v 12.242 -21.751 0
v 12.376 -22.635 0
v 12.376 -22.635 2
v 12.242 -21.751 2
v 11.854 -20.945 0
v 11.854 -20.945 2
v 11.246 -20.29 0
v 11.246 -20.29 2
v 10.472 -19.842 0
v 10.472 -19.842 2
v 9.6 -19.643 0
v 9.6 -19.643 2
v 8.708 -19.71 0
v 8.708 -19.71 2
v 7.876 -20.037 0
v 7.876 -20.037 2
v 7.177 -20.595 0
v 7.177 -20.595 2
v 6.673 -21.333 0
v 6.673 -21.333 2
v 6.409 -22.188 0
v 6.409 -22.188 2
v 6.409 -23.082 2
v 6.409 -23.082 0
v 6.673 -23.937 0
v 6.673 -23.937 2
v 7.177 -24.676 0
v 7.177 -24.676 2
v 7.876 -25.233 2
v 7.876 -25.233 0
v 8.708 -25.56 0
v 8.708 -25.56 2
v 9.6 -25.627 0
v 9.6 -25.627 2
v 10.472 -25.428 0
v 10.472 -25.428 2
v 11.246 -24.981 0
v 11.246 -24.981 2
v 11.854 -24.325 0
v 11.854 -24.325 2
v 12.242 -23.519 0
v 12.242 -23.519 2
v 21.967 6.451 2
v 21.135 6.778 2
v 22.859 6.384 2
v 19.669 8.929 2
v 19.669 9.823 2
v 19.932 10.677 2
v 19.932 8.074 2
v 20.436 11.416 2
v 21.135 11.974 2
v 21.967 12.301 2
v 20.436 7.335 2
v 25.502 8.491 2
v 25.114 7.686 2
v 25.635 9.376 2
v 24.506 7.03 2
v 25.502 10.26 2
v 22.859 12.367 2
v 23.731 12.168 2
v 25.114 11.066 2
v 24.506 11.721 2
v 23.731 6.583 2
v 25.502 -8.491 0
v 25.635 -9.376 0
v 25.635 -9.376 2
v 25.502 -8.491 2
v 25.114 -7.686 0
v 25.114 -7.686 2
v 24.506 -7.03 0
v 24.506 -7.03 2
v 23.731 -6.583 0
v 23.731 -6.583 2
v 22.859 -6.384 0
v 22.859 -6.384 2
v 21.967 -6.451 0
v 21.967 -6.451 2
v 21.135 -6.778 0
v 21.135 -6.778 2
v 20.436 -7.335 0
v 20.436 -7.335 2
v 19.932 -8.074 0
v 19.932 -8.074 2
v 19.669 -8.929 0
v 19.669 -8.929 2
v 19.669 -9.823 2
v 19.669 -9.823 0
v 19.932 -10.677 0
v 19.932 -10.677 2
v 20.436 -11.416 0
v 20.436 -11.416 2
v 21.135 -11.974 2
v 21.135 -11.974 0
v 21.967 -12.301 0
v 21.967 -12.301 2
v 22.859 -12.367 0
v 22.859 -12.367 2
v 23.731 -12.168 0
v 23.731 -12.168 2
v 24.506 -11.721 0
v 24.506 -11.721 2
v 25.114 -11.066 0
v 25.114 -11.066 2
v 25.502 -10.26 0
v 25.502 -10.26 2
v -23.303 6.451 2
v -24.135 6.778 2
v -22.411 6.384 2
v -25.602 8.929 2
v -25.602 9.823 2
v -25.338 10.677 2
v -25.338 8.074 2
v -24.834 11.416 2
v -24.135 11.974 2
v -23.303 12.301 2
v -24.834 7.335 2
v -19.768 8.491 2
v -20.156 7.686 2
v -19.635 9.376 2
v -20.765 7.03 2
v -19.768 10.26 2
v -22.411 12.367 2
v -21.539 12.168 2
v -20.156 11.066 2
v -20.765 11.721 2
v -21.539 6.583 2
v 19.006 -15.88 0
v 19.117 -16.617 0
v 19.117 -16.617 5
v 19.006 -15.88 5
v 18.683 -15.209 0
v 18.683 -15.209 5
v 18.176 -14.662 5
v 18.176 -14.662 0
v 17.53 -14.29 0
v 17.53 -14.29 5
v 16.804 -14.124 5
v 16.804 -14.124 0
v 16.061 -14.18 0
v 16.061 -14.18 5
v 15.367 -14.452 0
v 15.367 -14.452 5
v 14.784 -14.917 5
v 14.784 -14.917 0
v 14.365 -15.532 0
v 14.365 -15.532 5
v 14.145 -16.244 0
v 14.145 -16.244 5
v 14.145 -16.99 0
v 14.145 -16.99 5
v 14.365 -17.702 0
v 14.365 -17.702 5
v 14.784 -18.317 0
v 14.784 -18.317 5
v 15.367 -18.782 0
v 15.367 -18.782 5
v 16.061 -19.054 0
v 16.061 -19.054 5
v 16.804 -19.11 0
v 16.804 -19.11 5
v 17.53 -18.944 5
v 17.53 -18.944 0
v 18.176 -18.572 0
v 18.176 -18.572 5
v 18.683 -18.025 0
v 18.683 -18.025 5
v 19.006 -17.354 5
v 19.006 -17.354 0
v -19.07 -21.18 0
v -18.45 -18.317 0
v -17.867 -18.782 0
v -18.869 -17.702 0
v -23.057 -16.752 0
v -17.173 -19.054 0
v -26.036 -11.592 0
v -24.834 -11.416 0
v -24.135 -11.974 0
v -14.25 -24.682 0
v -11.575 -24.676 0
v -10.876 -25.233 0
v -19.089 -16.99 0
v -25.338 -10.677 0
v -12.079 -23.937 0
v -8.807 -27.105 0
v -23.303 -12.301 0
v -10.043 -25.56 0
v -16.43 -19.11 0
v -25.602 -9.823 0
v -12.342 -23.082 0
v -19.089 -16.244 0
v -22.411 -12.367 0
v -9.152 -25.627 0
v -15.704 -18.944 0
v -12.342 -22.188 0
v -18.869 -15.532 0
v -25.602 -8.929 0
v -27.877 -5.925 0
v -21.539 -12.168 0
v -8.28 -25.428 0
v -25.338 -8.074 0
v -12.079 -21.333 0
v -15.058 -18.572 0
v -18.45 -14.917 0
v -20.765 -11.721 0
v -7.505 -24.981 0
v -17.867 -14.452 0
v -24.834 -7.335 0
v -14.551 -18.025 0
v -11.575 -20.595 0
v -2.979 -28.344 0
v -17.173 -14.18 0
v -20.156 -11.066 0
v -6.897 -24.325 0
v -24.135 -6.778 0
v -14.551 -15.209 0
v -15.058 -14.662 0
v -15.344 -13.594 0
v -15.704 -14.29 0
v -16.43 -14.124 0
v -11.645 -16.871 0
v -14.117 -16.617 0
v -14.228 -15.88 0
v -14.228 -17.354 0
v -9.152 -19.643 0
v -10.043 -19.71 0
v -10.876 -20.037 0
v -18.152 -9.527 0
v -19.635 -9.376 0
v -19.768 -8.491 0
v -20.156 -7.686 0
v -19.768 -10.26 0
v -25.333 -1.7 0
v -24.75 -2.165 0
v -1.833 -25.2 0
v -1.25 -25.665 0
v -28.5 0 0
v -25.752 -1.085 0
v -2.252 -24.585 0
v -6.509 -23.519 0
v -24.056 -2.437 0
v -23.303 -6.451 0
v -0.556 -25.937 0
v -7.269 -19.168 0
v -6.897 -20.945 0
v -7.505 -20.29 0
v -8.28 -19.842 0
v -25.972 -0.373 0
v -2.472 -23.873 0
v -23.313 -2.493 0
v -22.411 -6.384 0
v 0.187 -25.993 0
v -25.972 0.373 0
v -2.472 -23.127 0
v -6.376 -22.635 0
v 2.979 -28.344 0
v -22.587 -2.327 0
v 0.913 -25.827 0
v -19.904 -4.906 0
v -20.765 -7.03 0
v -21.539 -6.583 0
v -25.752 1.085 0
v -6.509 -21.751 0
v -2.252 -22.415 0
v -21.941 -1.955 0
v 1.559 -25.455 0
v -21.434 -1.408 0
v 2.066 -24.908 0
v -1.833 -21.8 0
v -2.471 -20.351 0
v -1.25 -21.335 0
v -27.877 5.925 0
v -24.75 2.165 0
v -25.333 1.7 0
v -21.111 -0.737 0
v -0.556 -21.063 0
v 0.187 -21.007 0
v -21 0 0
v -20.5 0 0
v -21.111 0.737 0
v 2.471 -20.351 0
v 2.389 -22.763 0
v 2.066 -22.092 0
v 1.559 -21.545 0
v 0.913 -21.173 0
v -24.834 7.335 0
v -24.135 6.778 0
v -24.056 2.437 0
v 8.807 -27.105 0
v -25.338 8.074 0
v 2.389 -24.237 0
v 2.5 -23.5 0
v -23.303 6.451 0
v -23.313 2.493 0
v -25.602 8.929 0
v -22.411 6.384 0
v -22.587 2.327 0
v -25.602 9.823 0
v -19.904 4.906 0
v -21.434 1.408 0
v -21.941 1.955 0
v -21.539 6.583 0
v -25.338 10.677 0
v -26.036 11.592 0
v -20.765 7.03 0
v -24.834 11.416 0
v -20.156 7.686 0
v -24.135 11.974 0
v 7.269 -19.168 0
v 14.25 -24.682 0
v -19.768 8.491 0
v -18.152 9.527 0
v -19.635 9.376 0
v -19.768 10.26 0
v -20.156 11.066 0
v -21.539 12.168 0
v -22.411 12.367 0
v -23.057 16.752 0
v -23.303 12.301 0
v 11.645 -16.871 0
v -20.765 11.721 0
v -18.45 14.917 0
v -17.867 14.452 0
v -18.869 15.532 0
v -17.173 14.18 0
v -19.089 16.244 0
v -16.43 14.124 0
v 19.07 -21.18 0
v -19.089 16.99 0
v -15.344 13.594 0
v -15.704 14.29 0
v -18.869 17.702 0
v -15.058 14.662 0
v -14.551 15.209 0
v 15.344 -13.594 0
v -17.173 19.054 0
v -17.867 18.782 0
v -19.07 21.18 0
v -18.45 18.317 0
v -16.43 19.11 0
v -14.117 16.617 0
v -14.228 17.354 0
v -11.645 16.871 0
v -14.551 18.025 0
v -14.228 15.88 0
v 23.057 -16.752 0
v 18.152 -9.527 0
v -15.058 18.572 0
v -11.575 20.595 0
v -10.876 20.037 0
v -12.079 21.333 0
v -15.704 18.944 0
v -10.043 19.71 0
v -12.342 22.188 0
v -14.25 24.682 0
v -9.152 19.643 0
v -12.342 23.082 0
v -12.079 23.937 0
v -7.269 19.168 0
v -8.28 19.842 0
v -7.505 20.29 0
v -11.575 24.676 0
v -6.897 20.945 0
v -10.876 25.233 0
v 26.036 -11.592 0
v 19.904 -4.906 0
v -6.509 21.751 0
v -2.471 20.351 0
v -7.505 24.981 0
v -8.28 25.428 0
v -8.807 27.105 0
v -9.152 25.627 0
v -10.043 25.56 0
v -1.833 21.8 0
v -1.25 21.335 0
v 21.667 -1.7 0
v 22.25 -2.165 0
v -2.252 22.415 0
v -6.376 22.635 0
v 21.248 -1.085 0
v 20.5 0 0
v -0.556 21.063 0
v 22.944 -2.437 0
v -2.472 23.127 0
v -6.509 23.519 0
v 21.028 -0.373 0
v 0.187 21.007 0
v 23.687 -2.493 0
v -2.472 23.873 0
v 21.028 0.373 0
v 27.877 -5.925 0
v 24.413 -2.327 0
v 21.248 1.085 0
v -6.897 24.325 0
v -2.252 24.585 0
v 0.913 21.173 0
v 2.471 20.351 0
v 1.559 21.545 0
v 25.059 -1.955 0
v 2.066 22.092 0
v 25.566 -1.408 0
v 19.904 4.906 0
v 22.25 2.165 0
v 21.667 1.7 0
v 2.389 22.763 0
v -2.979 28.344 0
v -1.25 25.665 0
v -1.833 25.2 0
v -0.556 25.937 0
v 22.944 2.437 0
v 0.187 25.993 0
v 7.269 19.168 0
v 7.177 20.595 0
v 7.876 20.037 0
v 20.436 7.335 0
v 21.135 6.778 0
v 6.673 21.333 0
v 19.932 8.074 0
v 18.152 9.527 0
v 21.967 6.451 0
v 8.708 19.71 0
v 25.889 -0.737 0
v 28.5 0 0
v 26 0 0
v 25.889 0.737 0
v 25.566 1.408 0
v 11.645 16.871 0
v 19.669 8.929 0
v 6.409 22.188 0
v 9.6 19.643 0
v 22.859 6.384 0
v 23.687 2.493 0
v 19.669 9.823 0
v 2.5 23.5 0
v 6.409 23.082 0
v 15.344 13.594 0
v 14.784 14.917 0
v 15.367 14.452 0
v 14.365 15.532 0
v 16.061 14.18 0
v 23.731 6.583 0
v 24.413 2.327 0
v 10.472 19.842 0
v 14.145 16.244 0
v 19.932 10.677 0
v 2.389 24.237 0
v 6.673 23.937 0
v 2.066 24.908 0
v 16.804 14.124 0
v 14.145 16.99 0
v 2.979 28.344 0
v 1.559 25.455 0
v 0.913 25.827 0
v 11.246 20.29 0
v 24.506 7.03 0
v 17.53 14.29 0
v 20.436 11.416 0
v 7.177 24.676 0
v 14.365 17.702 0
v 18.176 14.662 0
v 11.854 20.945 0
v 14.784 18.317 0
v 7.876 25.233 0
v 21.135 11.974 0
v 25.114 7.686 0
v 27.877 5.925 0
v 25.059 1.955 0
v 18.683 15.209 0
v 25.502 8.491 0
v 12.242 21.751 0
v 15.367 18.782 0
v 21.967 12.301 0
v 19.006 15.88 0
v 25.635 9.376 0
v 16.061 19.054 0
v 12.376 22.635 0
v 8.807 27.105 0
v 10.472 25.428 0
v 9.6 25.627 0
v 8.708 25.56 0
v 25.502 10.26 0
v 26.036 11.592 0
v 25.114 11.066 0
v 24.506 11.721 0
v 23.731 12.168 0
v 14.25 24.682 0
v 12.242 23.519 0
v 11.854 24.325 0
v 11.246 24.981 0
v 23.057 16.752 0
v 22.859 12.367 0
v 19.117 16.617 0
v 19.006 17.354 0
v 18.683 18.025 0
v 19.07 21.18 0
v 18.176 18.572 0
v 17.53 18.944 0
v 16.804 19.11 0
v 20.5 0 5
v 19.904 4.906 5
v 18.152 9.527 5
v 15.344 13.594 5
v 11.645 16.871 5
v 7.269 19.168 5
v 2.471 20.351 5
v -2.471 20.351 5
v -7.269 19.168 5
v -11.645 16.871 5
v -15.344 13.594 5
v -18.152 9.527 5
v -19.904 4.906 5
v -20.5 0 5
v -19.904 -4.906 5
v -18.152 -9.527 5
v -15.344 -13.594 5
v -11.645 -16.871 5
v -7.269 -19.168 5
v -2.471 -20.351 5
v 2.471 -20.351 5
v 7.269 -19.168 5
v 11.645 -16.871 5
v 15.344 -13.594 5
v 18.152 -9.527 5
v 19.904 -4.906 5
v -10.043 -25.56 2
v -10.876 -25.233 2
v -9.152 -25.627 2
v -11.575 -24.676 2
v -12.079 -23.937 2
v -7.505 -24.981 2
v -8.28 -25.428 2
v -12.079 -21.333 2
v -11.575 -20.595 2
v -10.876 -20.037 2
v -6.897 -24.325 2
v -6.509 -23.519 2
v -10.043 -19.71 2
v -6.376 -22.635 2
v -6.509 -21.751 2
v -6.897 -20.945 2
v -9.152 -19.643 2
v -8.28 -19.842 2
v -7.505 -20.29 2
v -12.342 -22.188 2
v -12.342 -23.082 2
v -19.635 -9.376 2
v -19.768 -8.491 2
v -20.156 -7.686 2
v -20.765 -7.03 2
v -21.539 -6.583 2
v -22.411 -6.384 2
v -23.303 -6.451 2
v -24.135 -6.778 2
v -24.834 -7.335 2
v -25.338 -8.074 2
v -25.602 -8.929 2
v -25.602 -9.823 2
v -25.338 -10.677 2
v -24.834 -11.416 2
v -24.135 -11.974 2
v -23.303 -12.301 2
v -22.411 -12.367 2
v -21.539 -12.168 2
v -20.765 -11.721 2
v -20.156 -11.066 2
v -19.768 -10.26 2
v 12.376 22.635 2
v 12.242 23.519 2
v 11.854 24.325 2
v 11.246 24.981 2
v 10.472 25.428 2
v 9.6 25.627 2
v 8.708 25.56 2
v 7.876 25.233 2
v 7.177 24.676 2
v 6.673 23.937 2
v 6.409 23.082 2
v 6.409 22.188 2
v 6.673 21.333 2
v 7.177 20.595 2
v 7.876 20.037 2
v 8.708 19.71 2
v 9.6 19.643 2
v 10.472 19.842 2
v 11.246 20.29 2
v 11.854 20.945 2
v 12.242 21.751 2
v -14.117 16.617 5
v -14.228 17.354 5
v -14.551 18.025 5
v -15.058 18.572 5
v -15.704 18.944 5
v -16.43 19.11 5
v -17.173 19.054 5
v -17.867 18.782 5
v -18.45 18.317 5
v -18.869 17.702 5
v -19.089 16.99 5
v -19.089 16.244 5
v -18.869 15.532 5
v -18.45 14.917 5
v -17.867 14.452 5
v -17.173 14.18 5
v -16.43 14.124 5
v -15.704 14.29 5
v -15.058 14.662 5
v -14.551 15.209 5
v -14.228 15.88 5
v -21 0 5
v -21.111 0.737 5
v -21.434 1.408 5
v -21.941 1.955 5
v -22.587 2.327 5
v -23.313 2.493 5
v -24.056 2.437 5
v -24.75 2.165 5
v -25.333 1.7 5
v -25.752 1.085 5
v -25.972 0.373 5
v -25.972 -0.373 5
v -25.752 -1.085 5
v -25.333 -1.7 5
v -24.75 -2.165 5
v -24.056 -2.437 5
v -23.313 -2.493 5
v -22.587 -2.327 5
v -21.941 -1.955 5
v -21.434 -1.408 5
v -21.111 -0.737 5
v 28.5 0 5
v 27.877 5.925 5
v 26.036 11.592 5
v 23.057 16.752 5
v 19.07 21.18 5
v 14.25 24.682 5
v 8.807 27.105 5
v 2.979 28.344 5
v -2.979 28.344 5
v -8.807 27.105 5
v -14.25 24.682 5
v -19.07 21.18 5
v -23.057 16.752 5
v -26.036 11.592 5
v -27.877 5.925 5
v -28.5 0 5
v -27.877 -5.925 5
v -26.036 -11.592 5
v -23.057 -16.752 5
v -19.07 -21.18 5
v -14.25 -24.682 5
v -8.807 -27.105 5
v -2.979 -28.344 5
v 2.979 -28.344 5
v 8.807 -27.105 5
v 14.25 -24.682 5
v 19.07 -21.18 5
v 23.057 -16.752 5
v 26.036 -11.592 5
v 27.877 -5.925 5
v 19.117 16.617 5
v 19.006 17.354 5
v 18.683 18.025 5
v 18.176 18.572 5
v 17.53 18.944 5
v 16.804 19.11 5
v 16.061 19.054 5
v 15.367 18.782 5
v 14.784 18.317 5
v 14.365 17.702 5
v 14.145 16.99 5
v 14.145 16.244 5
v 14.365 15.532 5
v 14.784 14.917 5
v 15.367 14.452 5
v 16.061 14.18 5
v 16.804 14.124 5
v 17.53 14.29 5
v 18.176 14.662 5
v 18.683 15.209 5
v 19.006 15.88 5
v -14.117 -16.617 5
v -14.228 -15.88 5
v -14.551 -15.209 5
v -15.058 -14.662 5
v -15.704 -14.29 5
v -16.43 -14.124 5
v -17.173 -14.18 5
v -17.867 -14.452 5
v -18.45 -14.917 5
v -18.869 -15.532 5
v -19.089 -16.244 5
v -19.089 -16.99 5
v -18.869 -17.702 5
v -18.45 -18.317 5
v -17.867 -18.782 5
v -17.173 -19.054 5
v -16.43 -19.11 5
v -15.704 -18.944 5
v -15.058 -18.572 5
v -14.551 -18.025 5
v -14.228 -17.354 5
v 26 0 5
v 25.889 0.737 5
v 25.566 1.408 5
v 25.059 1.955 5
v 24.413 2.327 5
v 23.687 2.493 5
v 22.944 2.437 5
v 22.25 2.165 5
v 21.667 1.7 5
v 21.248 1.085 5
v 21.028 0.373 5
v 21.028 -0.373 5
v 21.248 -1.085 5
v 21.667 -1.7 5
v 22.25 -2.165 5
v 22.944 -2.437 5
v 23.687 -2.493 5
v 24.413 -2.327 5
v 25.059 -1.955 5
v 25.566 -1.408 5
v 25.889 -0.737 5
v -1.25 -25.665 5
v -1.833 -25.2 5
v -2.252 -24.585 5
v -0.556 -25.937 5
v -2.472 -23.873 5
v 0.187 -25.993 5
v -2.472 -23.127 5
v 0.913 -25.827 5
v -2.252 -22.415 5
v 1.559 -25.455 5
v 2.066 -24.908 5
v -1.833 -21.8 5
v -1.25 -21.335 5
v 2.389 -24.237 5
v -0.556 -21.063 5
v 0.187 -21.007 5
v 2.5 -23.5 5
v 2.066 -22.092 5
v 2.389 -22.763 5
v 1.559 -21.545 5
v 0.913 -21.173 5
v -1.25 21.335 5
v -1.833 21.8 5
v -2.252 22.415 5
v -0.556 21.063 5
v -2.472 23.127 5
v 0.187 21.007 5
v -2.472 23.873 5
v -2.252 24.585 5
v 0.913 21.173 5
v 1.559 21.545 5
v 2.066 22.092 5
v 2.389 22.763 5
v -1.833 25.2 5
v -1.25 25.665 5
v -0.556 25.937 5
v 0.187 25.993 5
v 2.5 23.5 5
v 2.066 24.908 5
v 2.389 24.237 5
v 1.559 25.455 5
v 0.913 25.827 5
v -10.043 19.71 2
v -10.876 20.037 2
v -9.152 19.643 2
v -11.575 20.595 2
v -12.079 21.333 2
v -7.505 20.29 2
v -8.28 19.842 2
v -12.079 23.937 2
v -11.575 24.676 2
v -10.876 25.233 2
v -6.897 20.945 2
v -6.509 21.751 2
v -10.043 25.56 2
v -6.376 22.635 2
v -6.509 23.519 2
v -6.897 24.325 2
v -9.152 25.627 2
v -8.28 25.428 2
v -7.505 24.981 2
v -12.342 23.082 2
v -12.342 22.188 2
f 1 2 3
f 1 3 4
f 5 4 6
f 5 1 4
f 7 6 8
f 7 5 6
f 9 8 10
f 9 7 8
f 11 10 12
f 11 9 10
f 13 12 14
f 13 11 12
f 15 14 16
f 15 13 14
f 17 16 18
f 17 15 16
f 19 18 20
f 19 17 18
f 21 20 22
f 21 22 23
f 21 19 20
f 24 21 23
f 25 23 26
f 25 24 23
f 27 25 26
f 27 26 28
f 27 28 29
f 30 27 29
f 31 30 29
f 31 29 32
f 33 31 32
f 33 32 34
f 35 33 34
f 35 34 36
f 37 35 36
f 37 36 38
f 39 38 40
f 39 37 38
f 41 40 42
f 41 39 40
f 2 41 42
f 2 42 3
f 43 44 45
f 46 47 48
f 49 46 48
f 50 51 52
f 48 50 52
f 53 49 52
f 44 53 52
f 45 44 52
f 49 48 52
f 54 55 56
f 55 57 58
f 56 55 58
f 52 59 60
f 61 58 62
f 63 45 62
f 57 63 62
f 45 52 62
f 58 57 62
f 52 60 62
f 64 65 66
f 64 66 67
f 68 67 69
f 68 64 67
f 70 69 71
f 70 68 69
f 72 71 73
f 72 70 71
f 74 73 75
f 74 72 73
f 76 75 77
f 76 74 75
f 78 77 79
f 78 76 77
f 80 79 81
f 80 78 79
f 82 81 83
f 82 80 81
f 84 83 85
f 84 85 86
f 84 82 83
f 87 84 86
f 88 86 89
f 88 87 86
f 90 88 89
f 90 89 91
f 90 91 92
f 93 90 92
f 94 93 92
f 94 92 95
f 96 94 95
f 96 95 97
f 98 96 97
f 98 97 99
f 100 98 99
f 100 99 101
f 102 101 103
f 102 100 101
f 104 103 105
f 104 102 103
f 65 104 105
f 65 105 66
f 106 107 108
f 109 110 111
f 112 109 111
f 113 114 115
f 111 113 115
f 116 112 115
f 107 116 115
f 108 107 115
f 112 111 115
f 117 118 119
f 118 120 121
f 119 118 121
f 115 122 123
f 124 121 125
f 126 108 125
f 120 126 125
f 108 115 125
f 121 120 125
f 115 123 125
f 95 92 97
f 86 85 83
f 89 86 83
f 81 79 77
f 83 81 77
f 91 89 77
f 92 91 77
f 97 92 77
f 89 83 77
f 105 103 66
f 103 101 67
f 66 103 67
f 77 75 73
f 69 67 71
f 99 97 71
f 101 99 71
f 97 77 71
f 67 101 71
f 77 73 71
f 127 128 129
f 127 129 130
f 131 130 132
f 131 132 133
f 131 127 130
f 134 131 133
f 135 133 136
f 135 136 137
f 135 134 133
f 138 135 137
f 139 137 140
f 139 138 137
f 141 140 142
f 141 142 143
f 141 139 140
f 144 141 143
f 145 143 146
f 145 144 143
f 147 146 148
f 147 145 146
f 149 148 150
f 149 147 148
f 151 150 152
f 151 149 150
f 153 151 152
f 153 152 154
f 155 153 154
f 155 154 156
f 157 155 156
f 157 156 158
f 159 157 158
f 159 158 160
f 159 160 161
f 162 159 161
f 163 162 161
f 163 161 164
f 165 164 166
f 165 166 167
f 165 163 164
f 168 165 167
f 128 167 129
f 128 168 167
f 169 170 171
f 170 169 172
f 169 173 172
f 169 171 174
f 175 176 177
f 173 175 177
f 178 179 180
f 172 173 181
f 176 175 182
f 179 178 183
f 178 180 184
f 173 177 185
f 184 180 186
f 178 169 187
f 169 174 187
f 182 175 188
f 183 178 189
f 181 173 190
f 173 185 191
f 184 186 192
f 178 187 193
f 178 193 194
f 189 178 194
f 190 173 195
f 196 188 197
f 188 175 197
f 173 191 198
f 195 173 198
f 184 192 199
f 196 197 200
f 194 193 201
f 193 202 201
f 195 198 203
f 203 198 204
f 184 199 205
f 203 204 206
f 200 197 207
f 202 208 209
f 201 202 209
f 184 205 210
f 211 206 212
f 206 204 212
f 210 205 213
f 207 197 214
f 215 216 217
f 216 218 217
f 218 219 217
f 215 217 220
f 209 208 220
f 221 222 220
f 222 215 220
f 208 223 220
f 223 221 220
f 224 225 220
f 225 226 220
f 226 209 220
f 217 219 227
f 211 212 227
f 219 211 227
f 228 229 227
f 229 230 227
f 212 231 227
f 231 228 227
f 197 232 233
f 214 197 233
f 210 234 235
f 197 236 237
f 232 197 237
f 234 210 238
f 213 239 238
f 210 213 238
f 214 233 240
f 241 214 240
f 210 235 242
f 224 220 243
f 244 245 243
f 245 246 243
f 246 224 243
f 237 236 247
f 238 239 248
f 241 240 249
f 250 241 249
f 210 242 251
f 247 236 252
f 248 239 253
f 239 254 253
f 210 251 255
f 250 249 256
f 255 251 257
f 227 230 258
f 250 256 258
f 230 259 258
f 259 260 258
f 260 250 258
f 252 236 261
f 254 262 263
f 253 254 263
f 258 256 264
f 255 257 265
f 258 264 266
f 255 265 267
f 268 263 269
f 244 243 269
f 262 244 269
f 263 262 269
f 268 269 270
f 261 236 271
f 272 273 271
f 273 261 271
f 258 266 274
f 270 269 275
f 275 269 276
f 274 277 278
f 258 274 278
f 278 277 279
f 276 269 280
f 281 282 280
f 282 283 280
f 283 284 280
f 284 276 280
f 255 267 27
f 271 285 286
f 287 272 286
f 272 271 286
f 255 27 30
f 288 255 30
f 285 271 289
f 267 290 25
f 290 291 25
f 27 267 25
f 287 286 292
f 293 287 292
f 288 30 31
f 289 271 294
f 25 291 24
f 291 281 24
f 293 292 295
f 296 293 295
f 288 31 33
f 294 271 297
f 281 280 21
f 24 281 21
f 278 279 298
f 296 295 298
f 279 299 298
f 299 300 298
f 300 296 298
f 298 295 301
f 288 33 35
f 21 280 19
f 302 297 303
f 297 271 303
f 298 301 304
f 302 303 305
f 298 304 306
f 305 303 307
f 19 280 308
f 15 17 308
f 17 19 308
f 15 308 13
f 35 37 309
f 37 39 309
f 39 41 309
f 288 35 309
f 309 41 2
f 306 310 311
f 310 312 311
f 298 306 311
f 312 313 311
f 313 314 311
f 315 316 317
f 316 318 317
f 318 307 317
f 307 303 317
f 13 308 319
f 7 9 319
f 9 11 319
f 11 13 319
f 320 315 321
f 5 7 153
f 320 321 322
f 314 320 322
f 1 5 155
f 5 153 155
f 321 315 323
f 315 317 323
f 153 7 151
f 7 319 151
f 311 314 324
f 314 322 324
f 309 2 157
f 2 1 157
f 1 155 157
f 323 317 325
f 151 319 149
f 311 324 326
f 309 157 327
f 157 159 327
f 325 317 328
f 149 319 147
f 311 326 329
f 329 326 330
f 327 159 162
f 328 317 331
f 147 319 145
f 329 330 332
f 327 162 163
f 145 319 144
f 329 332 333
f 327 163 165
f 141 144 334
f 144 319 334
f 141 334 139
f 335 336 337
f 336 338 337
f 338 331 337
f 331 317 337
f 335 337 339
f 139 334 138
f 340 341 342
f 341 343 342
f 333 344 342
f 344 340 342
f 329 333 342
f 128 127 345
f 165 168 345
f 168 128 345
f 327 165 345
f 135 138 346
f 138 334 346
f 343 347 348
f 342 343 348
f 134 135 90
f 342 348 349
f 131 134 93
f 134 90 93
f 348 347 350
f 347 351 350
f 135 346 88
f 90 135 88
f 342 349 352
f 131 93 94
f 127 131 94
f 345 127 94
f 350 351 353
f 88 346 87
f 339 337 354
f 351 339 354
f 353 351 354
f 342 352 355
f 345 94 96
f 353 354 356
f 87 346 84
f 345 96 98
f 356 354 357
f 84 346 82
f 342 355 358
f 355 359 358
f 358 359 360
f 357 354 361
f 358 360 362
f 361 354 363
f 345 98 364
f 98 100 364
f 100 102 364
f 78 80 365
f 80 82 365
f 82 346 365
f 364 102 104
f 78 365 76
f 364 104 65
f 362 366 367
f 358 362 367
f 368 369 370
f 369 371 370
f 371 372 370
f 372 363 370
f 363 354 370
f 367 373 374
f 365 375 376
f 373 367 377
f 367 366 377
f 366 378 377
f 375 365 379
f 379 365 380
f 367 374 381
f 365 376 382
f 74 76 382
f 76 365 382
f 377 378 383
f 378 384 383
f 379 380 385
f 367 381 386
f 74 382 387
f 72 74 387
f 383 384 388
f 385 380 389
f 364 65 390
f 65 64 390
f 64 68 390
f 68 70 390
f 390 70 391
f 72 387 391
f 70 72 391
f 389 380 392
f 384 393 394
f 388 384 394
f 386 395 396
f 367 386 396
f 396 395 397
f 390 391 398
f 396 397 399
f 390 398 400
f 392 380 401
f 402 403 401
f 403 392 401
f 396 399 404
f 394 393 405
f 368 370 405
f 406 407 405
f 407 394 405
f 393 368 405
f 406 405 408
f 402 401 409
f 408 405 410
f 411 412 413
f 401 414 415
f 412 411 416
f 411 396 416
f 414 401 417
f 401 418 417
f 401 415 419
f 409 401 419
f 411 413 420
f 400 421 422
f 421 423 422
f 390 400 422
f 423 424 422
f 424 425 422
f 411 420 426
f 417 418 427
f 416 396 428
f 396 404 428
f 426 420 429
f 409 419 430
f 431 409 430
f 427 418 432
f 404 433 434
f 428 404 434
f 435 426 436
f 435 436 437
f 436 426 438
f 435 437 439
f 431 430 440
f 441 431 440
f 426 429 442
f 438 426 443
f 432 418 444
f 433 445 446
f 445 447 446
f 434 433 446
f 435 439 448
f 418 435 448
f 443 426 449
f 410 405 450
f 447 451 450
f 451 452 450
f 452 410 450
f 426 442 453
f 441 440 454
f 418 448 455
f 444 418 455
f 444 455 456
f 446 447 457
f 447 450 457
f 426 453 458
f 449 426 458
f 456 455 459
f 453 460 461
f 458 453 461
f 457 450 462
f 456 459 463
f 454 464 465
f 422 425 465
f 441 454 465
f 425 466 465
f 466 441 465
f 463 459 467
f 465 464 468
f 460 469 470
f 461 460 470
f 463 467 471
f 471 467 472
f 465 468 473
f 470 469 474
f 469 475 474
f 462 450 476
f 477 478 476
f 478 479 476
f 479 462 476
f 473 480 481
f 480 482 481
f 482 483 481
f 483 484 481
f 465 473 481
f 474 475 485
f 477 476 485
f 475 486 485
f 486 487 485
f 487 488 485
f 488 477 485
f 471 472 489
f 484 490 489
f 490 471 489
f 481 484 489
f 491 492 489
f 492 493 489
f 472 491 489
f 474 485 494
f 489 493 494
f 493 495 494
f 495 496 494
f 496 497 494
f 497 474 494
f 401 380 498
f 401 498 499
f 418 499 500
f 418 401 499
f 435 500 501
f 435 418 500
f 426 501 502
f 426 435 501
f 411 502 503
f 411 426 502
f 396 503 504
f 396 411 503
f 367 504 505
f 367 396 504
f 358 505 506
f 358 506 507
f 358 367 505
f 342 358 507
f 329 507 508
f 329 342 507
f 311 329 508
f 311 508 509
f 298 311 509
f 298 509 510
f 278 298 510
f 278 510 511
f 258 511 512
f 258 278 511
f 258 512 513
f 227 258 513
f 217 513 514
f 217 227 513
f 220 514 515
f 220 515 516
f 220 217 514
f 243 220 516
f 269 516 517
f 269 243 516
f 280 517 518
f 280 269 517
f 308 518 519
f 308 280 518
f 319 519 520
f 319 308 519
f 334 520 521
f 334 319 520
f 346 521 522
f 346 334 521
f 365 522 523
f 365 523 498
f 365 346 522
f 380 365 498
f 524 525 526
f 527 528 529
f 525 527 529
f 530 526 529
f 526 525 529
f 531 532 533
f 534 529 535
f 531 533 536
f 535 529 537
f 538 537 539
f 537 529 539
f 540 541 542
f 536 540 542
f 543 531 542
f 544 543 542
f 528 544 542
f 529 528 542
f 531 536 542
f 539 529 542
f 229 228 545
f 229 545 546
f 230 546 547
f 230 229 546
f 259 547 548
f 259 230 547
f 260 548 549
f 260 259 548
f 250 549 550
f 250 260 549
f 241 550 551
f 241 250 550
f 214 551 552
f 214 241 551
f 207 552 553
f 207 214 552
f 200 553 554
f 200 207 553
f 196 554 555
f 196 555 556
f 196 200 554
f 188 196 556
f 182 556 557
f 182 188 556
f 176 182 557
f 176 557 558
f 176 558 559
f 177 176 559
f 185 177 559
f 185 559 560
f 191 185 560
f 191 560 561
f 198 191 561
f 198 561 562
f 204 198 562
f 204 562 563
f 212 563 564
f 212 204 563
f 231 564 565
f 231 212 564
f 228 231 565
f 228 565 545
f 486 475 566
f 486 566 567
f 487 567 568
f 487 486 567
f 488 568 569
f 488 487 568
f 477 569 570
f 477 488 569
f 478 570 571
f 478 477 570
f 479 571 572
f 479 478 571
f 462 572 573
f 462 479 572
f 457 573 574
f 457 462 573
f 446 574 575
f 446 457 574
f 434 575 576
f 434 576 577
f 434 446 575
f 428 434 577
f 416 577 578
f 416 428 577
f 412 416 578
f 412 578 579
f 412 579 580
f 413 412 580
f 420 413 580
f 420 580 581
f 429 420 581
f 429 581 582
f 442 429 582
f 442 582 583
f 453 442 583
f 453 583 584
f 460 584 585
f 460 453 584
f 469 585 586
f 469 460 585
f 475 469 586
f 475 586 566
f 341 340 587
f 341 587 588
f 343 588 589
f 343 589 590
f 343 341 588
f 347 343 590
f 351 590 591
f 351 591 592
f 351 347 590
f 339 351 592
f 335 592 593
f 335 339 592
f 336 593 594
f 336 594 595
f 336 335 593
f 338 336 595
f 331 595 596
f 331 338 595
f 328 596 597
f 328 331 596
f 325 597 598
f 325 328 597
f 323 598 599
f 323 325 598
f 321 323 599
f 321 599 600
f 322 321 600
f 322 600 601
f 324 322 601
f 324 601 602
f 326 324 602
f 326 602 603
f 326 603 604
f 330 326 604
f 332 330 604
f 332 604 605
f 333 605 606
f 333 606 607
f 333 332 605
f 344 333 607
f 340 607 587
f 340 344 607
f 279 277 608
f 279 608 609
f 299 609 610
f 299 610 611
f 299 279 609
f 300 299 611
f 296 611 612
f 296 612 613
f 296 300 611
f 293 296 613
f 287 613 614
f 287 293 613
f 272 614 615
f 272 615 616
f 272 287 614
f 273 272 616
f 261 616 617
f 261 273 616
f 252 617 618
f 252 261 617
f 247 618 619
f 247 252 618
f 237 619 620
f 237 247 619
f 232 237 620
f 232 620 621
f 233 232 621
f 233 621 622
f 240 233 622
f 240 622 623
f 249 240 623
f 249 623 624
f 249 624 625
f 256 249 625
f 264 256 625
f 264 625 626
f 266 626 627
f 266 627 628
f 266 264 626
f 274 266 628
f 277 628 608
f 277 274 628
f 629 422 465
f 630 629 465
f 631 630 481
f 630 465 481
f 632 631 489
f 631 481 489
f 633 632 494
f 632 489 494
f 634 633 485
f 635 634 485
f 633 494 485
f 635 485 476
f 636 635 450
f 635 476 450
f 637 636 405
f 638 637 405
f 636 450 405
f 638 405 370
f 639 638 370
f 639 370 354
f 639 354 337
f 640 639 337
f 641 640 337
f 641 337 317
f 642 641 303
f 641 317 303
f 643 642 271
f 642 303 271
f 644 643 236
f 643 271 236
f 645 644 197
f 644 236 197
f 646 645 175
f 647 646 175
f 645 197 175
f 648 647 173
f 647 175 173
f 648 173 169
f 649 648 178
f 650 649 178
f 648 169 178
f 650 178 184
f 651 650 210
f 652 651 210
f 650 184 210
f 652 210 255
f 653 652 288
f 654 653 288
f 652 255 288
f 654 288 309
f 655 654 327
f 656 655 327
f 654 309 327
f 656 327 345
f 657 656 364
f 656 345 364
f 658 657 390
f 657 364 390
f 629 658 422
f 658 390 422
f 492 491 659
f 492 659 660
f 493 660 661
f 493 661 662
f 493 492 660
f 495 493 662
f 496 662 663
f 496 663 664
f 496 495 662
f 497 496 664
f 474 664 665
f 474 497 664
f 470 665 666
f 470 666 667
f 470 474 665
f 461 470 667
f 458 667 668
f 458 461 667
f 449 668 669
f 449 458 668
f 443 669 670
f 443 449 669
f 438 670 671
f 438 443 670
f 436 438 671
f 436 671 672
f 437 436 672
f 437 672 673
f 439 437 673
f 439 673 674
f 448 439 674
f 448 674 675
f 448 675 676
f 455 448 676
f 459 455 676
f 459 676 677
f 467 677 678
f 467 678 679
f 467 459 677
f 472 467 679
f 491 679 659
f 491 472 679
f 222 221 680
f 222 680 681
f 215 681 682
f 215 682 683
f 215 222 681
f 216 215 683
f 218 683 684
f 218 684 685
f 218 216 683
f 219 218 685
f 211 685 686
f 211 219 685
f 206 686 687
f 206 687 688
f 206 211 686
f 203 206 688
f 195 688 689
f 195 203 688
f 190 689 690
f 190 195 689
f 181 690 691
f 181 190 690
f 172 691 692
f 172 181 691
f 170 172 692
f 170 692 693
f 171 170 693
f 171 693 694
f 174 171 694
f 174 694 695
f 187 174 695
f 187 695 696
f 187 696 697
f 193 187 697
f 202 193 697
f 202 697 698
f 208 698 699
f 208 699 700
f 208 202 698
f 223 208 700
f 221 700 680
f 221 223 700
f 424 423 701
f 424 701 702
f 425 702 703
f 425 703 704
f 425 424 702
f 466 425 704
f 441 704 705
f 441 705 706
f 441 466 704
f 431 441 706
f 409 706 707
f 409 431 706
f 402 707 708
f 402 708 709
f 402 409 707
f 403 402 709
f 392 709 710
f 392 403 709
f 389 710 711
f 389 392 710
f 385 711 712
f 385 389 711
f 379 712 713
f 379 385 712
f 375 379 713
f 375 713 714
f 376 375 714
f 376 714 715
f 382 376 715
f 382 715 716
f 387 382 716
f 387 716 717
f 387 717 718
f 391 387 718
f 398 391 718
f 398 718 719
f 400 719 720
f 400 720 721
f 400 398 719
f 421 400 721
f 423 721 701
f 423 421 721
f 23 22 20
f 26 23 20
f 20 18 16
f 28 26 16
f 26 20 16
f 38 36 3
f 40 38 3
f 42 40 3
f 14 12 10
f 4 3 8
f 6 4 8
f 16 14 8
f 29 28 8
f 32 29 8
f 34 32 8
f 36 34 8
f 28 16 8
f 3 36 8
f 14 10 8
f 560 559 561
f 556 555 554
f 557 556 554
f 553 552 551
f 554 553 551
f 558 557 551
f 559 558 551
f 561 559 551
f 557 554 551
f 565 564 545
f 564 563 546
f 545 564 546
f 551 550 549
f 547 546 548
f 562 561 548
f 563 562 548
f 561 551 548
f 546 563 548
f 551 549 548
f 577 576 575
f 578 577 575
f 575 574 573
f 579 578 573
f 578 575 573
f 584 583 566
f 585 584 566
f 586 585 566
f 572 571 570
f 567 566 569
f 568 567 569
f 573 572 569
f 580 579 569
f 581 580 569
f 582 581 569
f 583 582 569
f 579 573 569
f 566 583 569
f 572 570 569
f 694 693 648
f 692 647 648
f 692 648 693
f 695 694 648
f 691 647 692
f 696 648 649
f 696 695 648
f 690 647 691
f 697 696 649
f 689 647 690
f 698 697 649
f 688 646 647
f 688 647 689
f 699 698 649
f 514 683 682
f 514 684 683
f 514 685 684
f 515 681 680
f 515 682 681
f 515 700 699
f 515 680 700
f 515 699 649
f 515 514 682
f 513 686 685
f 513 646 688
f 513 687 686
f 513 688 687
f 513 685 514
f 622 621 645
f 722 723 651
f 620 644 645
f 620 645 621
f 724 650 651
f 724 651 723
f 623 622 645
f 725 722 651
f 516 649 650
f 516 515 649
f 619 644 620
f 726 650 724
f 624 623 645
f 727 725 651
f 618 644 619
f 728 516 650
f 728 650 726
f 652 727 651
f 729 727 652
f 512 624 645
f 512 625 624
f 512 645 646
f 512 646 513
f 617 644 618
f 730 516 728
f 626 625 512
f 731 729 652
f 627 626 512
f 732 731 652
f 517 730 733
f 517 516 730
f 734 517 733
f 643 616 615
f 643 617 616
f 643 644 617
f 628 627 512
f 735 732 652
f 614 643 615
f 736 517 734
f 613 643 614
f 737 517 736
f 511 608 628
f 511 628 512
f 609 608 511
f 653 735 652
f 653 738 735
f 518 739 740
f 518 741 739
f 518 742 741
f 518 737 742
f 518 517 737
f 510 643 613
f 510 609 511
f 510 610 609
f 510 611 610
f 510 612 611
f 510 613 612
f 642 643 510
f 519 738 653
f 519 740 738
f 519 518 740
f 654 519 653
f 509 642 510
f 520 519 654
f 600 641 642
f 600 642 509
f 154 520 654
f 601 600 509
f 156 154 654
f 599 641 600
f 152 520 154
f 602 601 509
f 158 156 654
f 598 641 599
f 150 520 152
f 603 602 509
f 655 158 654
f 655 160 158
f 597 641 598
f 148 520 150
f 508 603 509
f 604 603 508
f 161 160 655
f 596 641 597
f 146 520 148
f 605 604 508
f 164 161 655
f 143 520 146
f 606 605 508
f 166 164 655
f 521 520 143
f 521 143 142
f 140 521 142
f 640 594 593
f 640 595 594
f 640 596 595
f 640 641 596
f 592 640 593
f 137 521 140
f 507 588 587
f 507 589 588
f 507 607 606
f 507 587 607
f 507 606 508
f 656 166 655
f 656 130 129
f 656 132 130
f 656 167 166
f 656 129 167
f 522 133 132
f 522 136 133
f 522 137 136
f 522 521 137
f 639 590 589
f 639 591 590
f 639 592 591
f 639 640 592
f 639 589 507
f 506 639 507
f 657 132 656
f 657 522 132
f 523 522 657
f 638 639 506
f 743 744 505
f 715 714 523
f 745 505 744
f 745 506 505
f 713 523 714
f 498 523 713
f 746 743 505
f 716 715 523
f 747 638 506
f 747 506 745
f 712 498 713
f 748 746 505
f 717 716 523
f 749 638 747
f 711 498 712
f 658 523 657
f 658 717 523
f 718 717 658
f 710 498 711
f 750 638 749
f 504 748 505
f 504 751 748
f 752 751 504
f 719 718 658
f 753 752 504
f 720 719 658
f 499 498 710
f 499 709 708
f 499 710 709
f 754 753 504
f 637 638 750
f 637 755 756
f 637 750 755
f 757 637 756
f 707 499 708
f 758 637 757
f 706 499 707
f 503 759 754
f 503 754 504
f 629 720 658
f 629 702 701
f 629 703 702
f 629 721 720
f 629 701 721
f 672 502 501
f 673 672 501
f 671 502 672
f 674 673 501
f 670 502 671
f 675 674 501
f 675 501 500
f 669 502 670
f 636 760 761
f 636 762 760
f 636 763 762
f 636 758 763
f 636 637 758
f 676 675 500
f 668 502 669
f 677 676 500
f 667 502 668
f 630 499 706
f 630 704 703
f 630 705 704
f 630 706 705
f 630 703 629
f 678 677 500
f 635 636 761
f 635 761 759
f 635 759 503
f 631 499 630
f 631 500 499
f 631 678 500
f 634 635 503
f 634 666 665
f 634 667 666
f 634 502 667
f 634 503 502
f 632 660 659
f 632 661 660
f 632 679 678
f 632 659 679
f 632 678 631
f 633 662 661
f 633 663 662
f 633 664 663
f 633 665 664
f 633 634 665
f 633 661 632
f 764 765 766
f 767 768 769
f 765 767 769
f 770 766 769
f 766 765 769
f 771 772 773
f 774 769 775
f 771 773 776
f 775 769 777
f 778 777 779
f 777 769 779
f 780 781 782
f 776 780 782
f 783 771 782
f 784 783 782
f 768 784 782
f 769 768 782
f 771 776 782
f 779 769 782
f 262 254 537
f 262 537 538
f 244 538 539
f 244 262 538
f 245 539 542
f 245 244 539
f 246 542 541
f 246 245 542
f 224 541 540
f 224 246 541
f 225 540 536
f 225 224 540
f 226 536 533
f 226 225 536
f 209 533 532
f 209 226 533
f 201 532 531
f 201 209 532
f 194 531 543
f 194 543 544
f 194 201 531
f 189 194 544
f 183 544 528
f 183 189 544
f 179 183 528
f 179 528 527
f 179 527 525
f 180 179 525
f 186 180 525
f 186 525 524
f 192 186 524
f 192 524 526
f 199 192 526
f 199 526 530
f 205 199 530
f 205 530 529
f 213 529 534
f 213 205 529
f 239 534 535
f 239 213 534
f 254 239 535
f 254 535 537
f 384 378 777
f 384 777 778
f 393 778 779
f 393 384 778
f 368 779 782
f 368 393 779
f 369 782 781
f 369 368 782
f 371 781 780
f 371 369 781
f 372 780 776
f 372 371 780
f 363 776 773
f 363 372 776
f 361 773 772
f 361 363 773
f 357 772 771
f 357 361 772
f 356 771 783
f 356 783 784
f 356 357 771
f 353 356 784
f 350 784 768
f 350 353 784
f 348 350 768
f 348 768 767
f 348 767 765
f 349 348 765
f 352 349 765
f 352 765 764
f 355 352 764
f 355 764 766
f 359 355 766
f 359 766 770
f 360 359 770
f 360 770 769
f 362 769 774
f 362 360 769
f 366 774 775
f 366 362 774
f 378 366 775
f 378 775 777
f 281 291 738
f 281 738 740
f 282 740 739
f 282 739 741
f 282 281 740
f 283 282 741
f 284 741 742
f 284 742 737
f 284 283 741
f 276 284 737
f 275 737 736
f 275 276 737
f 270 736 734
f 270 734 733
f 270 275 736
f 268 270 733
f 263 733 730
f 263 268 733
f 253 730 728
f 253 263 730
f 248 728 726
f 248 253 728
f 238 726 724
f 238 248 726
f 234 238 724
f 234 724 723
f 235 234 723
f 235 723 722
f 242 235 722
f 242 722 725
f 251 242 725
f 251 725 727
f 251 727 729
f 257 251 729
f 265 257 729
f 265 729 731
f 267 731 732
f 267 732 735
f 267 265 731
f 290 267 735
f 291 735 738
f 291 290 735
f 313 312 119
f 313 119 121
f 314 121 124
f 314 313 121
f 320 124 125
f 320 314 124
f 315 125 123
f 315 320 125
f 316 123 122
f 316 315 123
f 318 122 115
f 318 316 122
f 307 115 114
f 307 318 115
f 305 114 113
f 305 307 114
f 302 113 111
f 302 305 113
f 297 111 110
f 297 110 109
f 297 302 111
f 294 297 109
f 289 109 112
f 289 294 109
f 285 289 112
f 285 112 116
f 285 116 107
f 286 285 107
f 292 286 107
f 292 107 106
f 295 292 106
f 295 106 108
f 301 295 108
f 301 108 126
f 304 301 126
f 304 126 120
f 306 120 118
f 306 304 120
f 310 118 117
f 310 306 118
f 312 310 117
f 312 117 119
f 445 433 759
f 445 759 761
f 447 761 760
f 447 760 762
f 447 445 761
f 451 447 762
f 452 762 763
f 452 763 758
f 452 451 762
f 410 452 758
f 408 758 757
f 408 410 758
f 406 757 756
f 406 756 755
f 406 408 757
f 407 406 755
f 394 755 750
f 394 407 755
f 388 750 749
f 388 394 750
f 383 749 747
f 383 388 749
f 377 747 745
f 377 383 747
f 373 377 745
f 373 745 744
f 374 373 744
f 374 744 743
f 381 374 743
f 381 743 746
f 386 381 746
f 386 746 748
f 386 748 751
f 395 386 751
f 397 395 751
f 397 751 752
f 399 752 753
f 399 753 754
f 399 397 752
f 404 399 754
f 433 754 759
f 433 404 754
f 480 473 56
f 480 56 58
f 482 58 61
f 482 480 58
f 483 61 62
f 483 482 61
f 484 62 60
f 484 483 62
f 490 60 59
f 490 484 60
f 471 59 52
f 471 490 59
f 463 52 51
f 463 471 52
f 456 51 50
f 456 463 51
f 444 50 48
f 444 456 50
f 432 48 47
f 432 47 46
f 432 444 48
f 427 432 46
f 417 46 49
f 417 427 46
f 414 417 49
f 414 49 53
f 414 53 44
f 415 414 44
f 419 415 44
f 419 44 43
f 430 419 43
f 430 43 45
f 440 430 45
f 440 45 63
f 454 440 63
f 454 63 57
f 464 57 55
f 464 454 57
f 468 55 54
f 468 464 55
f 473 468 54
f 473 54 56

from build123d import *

# Parameters (mm, degrees)
F0_R     = 28.5
F0_R_2   = 2.5
F0_R_3   = 3
F0_R_4   = 20.5
F1_DEPTH = 5
F2_DEPTH = 2


with BuildPart() as f1:
    # F0 (on Top) → F1 (new body)
    with BuildSketch(Plane.XY):
        Circle(F0_R)
        with Locations((-16.6170093579, -16.6170093579)):
            Circle(F0_R_2, mode=Mode.SUBTRACT)
        with Locations((-9.3757440929, -22.6350485465)):
            Circle(F0_R_3, mode=Mode.SUBTRACT)
        with Locations((-22.6350485465, -9.3757440929)):
            Circle(F0_R_3, mode=Mode.SUBTRACT)
        with Locations((0, -23.5)):
            Circle(F0_R_2, mode=Mode.SUBTRACT)
        with Locations((9.3757440929, -22.6350485465)):
            Circle(F0_R_3, mode=Mode.SUBTRACT)
        with Locations((16.6170093579, -16.6170093579)):
            Circle(F0_R_2, mode=Mode.SUBTRACT)
        with Locations((22.6350485465, -9.3757440929)):
            Circle(F0_R_3, mode=Mode.SUBTRACT)
        with Locations((-23.5, 0)):
            Circle(F0_R_2, mode=Mode.SUBTRACT)
        with Locations((-22.6350485465, 9.3757440929)):
            Circle(F0_R_3, mode=Mode.SUBTRACT)
        with Locations((-16.6170093579, 16.6170093579)):
            Circle(F0_R_2, mode=Mode.SUBTRACT)
        with Locations((-9.3757440929, 22.6350485465)):
            Circle(F0_R_3, mode=Mode.SUBTRACT)
        Circle(F0_R_4, mode=Mode.SUBTRACT)
        with Locations((23.5, 0)):
            Circle(F0_R_2, mode=Mode.SUBTRACT)
        with Locations((22.6350485465, 9.3757440929)):
            Circle(F0_R_3, mode=Mode.SUBTRACT)
        with Locations((0, 23.5)):
            Circle(F0_R_2, mode=Mode.SUBTRACT)
        with Locations((9.3757440929, 22.6350485465)):
            Circle(F0_R_3, mode=Mode.SUBTRACT)
        with Locations((16.6170093579, 16.6170093579)):
            Circle(F0_R_2, mode=Mode.SUBTRACT)
        with Locations((-22.6350485465, 9.3757440929)):
            Circle(F0_R_3)
        with Locations((-9.3757440929, 22.6350485465)):
            Circle(F0_R_3)
        with Locations((9.3757440929, 22.6350485465)):
            Circle(F0_R_3)
        with Locations((22.6350485465, 9.3757440929)):
            Circle(F0_R_3)
        with Locations((22.6350485465, -9.3757440929)):
            Circle(F0_R_3)
        with Locations((9.3757440929, -22.6350485465)):
            Circle(F0_R_3)
        with Locations((-9.3757440929, -22.6350485465)):
            Circle(F0_R_3)
        with Locations((-22.6350485465, -9.3757440929)):
            Circle(F0_R_3)
    extrude(amount=F1_DEPTH)

    # F0 (on Top) → F2 (cut)
    with BuildSketch(Plane.XY):
        with Locations((-22.6350485465, -9.3757440929)):
            Circle(F0_R_3)
        with Locations((-9.3757440929, -22.6350485465)):
            Circle(F0_R_3)
        with Locations((9.3757440929, -22.6350485465)):
            Circle(F0_R_3)
        with Locations((22.6350485465, -9.3757440929)):
            Circle(F0_R_3)
        with Locations((22.6350485465, 9.3757440929)):
            Circle(F0_R_3)
        with Locations((9.3757440929, 22.6350485465)):
            Circle(F0_R_3)
        with Locations((-9.3757440929, 22.6350485465)):
            Circle(F0_R_3)
        with Locations((-22.6350485465, 9.3757440929)):
            Circle(F0_R_3)
    extrude(amount=F2_DEPTH, mode=Mode.SUBTRACT)


solid = f1.part
